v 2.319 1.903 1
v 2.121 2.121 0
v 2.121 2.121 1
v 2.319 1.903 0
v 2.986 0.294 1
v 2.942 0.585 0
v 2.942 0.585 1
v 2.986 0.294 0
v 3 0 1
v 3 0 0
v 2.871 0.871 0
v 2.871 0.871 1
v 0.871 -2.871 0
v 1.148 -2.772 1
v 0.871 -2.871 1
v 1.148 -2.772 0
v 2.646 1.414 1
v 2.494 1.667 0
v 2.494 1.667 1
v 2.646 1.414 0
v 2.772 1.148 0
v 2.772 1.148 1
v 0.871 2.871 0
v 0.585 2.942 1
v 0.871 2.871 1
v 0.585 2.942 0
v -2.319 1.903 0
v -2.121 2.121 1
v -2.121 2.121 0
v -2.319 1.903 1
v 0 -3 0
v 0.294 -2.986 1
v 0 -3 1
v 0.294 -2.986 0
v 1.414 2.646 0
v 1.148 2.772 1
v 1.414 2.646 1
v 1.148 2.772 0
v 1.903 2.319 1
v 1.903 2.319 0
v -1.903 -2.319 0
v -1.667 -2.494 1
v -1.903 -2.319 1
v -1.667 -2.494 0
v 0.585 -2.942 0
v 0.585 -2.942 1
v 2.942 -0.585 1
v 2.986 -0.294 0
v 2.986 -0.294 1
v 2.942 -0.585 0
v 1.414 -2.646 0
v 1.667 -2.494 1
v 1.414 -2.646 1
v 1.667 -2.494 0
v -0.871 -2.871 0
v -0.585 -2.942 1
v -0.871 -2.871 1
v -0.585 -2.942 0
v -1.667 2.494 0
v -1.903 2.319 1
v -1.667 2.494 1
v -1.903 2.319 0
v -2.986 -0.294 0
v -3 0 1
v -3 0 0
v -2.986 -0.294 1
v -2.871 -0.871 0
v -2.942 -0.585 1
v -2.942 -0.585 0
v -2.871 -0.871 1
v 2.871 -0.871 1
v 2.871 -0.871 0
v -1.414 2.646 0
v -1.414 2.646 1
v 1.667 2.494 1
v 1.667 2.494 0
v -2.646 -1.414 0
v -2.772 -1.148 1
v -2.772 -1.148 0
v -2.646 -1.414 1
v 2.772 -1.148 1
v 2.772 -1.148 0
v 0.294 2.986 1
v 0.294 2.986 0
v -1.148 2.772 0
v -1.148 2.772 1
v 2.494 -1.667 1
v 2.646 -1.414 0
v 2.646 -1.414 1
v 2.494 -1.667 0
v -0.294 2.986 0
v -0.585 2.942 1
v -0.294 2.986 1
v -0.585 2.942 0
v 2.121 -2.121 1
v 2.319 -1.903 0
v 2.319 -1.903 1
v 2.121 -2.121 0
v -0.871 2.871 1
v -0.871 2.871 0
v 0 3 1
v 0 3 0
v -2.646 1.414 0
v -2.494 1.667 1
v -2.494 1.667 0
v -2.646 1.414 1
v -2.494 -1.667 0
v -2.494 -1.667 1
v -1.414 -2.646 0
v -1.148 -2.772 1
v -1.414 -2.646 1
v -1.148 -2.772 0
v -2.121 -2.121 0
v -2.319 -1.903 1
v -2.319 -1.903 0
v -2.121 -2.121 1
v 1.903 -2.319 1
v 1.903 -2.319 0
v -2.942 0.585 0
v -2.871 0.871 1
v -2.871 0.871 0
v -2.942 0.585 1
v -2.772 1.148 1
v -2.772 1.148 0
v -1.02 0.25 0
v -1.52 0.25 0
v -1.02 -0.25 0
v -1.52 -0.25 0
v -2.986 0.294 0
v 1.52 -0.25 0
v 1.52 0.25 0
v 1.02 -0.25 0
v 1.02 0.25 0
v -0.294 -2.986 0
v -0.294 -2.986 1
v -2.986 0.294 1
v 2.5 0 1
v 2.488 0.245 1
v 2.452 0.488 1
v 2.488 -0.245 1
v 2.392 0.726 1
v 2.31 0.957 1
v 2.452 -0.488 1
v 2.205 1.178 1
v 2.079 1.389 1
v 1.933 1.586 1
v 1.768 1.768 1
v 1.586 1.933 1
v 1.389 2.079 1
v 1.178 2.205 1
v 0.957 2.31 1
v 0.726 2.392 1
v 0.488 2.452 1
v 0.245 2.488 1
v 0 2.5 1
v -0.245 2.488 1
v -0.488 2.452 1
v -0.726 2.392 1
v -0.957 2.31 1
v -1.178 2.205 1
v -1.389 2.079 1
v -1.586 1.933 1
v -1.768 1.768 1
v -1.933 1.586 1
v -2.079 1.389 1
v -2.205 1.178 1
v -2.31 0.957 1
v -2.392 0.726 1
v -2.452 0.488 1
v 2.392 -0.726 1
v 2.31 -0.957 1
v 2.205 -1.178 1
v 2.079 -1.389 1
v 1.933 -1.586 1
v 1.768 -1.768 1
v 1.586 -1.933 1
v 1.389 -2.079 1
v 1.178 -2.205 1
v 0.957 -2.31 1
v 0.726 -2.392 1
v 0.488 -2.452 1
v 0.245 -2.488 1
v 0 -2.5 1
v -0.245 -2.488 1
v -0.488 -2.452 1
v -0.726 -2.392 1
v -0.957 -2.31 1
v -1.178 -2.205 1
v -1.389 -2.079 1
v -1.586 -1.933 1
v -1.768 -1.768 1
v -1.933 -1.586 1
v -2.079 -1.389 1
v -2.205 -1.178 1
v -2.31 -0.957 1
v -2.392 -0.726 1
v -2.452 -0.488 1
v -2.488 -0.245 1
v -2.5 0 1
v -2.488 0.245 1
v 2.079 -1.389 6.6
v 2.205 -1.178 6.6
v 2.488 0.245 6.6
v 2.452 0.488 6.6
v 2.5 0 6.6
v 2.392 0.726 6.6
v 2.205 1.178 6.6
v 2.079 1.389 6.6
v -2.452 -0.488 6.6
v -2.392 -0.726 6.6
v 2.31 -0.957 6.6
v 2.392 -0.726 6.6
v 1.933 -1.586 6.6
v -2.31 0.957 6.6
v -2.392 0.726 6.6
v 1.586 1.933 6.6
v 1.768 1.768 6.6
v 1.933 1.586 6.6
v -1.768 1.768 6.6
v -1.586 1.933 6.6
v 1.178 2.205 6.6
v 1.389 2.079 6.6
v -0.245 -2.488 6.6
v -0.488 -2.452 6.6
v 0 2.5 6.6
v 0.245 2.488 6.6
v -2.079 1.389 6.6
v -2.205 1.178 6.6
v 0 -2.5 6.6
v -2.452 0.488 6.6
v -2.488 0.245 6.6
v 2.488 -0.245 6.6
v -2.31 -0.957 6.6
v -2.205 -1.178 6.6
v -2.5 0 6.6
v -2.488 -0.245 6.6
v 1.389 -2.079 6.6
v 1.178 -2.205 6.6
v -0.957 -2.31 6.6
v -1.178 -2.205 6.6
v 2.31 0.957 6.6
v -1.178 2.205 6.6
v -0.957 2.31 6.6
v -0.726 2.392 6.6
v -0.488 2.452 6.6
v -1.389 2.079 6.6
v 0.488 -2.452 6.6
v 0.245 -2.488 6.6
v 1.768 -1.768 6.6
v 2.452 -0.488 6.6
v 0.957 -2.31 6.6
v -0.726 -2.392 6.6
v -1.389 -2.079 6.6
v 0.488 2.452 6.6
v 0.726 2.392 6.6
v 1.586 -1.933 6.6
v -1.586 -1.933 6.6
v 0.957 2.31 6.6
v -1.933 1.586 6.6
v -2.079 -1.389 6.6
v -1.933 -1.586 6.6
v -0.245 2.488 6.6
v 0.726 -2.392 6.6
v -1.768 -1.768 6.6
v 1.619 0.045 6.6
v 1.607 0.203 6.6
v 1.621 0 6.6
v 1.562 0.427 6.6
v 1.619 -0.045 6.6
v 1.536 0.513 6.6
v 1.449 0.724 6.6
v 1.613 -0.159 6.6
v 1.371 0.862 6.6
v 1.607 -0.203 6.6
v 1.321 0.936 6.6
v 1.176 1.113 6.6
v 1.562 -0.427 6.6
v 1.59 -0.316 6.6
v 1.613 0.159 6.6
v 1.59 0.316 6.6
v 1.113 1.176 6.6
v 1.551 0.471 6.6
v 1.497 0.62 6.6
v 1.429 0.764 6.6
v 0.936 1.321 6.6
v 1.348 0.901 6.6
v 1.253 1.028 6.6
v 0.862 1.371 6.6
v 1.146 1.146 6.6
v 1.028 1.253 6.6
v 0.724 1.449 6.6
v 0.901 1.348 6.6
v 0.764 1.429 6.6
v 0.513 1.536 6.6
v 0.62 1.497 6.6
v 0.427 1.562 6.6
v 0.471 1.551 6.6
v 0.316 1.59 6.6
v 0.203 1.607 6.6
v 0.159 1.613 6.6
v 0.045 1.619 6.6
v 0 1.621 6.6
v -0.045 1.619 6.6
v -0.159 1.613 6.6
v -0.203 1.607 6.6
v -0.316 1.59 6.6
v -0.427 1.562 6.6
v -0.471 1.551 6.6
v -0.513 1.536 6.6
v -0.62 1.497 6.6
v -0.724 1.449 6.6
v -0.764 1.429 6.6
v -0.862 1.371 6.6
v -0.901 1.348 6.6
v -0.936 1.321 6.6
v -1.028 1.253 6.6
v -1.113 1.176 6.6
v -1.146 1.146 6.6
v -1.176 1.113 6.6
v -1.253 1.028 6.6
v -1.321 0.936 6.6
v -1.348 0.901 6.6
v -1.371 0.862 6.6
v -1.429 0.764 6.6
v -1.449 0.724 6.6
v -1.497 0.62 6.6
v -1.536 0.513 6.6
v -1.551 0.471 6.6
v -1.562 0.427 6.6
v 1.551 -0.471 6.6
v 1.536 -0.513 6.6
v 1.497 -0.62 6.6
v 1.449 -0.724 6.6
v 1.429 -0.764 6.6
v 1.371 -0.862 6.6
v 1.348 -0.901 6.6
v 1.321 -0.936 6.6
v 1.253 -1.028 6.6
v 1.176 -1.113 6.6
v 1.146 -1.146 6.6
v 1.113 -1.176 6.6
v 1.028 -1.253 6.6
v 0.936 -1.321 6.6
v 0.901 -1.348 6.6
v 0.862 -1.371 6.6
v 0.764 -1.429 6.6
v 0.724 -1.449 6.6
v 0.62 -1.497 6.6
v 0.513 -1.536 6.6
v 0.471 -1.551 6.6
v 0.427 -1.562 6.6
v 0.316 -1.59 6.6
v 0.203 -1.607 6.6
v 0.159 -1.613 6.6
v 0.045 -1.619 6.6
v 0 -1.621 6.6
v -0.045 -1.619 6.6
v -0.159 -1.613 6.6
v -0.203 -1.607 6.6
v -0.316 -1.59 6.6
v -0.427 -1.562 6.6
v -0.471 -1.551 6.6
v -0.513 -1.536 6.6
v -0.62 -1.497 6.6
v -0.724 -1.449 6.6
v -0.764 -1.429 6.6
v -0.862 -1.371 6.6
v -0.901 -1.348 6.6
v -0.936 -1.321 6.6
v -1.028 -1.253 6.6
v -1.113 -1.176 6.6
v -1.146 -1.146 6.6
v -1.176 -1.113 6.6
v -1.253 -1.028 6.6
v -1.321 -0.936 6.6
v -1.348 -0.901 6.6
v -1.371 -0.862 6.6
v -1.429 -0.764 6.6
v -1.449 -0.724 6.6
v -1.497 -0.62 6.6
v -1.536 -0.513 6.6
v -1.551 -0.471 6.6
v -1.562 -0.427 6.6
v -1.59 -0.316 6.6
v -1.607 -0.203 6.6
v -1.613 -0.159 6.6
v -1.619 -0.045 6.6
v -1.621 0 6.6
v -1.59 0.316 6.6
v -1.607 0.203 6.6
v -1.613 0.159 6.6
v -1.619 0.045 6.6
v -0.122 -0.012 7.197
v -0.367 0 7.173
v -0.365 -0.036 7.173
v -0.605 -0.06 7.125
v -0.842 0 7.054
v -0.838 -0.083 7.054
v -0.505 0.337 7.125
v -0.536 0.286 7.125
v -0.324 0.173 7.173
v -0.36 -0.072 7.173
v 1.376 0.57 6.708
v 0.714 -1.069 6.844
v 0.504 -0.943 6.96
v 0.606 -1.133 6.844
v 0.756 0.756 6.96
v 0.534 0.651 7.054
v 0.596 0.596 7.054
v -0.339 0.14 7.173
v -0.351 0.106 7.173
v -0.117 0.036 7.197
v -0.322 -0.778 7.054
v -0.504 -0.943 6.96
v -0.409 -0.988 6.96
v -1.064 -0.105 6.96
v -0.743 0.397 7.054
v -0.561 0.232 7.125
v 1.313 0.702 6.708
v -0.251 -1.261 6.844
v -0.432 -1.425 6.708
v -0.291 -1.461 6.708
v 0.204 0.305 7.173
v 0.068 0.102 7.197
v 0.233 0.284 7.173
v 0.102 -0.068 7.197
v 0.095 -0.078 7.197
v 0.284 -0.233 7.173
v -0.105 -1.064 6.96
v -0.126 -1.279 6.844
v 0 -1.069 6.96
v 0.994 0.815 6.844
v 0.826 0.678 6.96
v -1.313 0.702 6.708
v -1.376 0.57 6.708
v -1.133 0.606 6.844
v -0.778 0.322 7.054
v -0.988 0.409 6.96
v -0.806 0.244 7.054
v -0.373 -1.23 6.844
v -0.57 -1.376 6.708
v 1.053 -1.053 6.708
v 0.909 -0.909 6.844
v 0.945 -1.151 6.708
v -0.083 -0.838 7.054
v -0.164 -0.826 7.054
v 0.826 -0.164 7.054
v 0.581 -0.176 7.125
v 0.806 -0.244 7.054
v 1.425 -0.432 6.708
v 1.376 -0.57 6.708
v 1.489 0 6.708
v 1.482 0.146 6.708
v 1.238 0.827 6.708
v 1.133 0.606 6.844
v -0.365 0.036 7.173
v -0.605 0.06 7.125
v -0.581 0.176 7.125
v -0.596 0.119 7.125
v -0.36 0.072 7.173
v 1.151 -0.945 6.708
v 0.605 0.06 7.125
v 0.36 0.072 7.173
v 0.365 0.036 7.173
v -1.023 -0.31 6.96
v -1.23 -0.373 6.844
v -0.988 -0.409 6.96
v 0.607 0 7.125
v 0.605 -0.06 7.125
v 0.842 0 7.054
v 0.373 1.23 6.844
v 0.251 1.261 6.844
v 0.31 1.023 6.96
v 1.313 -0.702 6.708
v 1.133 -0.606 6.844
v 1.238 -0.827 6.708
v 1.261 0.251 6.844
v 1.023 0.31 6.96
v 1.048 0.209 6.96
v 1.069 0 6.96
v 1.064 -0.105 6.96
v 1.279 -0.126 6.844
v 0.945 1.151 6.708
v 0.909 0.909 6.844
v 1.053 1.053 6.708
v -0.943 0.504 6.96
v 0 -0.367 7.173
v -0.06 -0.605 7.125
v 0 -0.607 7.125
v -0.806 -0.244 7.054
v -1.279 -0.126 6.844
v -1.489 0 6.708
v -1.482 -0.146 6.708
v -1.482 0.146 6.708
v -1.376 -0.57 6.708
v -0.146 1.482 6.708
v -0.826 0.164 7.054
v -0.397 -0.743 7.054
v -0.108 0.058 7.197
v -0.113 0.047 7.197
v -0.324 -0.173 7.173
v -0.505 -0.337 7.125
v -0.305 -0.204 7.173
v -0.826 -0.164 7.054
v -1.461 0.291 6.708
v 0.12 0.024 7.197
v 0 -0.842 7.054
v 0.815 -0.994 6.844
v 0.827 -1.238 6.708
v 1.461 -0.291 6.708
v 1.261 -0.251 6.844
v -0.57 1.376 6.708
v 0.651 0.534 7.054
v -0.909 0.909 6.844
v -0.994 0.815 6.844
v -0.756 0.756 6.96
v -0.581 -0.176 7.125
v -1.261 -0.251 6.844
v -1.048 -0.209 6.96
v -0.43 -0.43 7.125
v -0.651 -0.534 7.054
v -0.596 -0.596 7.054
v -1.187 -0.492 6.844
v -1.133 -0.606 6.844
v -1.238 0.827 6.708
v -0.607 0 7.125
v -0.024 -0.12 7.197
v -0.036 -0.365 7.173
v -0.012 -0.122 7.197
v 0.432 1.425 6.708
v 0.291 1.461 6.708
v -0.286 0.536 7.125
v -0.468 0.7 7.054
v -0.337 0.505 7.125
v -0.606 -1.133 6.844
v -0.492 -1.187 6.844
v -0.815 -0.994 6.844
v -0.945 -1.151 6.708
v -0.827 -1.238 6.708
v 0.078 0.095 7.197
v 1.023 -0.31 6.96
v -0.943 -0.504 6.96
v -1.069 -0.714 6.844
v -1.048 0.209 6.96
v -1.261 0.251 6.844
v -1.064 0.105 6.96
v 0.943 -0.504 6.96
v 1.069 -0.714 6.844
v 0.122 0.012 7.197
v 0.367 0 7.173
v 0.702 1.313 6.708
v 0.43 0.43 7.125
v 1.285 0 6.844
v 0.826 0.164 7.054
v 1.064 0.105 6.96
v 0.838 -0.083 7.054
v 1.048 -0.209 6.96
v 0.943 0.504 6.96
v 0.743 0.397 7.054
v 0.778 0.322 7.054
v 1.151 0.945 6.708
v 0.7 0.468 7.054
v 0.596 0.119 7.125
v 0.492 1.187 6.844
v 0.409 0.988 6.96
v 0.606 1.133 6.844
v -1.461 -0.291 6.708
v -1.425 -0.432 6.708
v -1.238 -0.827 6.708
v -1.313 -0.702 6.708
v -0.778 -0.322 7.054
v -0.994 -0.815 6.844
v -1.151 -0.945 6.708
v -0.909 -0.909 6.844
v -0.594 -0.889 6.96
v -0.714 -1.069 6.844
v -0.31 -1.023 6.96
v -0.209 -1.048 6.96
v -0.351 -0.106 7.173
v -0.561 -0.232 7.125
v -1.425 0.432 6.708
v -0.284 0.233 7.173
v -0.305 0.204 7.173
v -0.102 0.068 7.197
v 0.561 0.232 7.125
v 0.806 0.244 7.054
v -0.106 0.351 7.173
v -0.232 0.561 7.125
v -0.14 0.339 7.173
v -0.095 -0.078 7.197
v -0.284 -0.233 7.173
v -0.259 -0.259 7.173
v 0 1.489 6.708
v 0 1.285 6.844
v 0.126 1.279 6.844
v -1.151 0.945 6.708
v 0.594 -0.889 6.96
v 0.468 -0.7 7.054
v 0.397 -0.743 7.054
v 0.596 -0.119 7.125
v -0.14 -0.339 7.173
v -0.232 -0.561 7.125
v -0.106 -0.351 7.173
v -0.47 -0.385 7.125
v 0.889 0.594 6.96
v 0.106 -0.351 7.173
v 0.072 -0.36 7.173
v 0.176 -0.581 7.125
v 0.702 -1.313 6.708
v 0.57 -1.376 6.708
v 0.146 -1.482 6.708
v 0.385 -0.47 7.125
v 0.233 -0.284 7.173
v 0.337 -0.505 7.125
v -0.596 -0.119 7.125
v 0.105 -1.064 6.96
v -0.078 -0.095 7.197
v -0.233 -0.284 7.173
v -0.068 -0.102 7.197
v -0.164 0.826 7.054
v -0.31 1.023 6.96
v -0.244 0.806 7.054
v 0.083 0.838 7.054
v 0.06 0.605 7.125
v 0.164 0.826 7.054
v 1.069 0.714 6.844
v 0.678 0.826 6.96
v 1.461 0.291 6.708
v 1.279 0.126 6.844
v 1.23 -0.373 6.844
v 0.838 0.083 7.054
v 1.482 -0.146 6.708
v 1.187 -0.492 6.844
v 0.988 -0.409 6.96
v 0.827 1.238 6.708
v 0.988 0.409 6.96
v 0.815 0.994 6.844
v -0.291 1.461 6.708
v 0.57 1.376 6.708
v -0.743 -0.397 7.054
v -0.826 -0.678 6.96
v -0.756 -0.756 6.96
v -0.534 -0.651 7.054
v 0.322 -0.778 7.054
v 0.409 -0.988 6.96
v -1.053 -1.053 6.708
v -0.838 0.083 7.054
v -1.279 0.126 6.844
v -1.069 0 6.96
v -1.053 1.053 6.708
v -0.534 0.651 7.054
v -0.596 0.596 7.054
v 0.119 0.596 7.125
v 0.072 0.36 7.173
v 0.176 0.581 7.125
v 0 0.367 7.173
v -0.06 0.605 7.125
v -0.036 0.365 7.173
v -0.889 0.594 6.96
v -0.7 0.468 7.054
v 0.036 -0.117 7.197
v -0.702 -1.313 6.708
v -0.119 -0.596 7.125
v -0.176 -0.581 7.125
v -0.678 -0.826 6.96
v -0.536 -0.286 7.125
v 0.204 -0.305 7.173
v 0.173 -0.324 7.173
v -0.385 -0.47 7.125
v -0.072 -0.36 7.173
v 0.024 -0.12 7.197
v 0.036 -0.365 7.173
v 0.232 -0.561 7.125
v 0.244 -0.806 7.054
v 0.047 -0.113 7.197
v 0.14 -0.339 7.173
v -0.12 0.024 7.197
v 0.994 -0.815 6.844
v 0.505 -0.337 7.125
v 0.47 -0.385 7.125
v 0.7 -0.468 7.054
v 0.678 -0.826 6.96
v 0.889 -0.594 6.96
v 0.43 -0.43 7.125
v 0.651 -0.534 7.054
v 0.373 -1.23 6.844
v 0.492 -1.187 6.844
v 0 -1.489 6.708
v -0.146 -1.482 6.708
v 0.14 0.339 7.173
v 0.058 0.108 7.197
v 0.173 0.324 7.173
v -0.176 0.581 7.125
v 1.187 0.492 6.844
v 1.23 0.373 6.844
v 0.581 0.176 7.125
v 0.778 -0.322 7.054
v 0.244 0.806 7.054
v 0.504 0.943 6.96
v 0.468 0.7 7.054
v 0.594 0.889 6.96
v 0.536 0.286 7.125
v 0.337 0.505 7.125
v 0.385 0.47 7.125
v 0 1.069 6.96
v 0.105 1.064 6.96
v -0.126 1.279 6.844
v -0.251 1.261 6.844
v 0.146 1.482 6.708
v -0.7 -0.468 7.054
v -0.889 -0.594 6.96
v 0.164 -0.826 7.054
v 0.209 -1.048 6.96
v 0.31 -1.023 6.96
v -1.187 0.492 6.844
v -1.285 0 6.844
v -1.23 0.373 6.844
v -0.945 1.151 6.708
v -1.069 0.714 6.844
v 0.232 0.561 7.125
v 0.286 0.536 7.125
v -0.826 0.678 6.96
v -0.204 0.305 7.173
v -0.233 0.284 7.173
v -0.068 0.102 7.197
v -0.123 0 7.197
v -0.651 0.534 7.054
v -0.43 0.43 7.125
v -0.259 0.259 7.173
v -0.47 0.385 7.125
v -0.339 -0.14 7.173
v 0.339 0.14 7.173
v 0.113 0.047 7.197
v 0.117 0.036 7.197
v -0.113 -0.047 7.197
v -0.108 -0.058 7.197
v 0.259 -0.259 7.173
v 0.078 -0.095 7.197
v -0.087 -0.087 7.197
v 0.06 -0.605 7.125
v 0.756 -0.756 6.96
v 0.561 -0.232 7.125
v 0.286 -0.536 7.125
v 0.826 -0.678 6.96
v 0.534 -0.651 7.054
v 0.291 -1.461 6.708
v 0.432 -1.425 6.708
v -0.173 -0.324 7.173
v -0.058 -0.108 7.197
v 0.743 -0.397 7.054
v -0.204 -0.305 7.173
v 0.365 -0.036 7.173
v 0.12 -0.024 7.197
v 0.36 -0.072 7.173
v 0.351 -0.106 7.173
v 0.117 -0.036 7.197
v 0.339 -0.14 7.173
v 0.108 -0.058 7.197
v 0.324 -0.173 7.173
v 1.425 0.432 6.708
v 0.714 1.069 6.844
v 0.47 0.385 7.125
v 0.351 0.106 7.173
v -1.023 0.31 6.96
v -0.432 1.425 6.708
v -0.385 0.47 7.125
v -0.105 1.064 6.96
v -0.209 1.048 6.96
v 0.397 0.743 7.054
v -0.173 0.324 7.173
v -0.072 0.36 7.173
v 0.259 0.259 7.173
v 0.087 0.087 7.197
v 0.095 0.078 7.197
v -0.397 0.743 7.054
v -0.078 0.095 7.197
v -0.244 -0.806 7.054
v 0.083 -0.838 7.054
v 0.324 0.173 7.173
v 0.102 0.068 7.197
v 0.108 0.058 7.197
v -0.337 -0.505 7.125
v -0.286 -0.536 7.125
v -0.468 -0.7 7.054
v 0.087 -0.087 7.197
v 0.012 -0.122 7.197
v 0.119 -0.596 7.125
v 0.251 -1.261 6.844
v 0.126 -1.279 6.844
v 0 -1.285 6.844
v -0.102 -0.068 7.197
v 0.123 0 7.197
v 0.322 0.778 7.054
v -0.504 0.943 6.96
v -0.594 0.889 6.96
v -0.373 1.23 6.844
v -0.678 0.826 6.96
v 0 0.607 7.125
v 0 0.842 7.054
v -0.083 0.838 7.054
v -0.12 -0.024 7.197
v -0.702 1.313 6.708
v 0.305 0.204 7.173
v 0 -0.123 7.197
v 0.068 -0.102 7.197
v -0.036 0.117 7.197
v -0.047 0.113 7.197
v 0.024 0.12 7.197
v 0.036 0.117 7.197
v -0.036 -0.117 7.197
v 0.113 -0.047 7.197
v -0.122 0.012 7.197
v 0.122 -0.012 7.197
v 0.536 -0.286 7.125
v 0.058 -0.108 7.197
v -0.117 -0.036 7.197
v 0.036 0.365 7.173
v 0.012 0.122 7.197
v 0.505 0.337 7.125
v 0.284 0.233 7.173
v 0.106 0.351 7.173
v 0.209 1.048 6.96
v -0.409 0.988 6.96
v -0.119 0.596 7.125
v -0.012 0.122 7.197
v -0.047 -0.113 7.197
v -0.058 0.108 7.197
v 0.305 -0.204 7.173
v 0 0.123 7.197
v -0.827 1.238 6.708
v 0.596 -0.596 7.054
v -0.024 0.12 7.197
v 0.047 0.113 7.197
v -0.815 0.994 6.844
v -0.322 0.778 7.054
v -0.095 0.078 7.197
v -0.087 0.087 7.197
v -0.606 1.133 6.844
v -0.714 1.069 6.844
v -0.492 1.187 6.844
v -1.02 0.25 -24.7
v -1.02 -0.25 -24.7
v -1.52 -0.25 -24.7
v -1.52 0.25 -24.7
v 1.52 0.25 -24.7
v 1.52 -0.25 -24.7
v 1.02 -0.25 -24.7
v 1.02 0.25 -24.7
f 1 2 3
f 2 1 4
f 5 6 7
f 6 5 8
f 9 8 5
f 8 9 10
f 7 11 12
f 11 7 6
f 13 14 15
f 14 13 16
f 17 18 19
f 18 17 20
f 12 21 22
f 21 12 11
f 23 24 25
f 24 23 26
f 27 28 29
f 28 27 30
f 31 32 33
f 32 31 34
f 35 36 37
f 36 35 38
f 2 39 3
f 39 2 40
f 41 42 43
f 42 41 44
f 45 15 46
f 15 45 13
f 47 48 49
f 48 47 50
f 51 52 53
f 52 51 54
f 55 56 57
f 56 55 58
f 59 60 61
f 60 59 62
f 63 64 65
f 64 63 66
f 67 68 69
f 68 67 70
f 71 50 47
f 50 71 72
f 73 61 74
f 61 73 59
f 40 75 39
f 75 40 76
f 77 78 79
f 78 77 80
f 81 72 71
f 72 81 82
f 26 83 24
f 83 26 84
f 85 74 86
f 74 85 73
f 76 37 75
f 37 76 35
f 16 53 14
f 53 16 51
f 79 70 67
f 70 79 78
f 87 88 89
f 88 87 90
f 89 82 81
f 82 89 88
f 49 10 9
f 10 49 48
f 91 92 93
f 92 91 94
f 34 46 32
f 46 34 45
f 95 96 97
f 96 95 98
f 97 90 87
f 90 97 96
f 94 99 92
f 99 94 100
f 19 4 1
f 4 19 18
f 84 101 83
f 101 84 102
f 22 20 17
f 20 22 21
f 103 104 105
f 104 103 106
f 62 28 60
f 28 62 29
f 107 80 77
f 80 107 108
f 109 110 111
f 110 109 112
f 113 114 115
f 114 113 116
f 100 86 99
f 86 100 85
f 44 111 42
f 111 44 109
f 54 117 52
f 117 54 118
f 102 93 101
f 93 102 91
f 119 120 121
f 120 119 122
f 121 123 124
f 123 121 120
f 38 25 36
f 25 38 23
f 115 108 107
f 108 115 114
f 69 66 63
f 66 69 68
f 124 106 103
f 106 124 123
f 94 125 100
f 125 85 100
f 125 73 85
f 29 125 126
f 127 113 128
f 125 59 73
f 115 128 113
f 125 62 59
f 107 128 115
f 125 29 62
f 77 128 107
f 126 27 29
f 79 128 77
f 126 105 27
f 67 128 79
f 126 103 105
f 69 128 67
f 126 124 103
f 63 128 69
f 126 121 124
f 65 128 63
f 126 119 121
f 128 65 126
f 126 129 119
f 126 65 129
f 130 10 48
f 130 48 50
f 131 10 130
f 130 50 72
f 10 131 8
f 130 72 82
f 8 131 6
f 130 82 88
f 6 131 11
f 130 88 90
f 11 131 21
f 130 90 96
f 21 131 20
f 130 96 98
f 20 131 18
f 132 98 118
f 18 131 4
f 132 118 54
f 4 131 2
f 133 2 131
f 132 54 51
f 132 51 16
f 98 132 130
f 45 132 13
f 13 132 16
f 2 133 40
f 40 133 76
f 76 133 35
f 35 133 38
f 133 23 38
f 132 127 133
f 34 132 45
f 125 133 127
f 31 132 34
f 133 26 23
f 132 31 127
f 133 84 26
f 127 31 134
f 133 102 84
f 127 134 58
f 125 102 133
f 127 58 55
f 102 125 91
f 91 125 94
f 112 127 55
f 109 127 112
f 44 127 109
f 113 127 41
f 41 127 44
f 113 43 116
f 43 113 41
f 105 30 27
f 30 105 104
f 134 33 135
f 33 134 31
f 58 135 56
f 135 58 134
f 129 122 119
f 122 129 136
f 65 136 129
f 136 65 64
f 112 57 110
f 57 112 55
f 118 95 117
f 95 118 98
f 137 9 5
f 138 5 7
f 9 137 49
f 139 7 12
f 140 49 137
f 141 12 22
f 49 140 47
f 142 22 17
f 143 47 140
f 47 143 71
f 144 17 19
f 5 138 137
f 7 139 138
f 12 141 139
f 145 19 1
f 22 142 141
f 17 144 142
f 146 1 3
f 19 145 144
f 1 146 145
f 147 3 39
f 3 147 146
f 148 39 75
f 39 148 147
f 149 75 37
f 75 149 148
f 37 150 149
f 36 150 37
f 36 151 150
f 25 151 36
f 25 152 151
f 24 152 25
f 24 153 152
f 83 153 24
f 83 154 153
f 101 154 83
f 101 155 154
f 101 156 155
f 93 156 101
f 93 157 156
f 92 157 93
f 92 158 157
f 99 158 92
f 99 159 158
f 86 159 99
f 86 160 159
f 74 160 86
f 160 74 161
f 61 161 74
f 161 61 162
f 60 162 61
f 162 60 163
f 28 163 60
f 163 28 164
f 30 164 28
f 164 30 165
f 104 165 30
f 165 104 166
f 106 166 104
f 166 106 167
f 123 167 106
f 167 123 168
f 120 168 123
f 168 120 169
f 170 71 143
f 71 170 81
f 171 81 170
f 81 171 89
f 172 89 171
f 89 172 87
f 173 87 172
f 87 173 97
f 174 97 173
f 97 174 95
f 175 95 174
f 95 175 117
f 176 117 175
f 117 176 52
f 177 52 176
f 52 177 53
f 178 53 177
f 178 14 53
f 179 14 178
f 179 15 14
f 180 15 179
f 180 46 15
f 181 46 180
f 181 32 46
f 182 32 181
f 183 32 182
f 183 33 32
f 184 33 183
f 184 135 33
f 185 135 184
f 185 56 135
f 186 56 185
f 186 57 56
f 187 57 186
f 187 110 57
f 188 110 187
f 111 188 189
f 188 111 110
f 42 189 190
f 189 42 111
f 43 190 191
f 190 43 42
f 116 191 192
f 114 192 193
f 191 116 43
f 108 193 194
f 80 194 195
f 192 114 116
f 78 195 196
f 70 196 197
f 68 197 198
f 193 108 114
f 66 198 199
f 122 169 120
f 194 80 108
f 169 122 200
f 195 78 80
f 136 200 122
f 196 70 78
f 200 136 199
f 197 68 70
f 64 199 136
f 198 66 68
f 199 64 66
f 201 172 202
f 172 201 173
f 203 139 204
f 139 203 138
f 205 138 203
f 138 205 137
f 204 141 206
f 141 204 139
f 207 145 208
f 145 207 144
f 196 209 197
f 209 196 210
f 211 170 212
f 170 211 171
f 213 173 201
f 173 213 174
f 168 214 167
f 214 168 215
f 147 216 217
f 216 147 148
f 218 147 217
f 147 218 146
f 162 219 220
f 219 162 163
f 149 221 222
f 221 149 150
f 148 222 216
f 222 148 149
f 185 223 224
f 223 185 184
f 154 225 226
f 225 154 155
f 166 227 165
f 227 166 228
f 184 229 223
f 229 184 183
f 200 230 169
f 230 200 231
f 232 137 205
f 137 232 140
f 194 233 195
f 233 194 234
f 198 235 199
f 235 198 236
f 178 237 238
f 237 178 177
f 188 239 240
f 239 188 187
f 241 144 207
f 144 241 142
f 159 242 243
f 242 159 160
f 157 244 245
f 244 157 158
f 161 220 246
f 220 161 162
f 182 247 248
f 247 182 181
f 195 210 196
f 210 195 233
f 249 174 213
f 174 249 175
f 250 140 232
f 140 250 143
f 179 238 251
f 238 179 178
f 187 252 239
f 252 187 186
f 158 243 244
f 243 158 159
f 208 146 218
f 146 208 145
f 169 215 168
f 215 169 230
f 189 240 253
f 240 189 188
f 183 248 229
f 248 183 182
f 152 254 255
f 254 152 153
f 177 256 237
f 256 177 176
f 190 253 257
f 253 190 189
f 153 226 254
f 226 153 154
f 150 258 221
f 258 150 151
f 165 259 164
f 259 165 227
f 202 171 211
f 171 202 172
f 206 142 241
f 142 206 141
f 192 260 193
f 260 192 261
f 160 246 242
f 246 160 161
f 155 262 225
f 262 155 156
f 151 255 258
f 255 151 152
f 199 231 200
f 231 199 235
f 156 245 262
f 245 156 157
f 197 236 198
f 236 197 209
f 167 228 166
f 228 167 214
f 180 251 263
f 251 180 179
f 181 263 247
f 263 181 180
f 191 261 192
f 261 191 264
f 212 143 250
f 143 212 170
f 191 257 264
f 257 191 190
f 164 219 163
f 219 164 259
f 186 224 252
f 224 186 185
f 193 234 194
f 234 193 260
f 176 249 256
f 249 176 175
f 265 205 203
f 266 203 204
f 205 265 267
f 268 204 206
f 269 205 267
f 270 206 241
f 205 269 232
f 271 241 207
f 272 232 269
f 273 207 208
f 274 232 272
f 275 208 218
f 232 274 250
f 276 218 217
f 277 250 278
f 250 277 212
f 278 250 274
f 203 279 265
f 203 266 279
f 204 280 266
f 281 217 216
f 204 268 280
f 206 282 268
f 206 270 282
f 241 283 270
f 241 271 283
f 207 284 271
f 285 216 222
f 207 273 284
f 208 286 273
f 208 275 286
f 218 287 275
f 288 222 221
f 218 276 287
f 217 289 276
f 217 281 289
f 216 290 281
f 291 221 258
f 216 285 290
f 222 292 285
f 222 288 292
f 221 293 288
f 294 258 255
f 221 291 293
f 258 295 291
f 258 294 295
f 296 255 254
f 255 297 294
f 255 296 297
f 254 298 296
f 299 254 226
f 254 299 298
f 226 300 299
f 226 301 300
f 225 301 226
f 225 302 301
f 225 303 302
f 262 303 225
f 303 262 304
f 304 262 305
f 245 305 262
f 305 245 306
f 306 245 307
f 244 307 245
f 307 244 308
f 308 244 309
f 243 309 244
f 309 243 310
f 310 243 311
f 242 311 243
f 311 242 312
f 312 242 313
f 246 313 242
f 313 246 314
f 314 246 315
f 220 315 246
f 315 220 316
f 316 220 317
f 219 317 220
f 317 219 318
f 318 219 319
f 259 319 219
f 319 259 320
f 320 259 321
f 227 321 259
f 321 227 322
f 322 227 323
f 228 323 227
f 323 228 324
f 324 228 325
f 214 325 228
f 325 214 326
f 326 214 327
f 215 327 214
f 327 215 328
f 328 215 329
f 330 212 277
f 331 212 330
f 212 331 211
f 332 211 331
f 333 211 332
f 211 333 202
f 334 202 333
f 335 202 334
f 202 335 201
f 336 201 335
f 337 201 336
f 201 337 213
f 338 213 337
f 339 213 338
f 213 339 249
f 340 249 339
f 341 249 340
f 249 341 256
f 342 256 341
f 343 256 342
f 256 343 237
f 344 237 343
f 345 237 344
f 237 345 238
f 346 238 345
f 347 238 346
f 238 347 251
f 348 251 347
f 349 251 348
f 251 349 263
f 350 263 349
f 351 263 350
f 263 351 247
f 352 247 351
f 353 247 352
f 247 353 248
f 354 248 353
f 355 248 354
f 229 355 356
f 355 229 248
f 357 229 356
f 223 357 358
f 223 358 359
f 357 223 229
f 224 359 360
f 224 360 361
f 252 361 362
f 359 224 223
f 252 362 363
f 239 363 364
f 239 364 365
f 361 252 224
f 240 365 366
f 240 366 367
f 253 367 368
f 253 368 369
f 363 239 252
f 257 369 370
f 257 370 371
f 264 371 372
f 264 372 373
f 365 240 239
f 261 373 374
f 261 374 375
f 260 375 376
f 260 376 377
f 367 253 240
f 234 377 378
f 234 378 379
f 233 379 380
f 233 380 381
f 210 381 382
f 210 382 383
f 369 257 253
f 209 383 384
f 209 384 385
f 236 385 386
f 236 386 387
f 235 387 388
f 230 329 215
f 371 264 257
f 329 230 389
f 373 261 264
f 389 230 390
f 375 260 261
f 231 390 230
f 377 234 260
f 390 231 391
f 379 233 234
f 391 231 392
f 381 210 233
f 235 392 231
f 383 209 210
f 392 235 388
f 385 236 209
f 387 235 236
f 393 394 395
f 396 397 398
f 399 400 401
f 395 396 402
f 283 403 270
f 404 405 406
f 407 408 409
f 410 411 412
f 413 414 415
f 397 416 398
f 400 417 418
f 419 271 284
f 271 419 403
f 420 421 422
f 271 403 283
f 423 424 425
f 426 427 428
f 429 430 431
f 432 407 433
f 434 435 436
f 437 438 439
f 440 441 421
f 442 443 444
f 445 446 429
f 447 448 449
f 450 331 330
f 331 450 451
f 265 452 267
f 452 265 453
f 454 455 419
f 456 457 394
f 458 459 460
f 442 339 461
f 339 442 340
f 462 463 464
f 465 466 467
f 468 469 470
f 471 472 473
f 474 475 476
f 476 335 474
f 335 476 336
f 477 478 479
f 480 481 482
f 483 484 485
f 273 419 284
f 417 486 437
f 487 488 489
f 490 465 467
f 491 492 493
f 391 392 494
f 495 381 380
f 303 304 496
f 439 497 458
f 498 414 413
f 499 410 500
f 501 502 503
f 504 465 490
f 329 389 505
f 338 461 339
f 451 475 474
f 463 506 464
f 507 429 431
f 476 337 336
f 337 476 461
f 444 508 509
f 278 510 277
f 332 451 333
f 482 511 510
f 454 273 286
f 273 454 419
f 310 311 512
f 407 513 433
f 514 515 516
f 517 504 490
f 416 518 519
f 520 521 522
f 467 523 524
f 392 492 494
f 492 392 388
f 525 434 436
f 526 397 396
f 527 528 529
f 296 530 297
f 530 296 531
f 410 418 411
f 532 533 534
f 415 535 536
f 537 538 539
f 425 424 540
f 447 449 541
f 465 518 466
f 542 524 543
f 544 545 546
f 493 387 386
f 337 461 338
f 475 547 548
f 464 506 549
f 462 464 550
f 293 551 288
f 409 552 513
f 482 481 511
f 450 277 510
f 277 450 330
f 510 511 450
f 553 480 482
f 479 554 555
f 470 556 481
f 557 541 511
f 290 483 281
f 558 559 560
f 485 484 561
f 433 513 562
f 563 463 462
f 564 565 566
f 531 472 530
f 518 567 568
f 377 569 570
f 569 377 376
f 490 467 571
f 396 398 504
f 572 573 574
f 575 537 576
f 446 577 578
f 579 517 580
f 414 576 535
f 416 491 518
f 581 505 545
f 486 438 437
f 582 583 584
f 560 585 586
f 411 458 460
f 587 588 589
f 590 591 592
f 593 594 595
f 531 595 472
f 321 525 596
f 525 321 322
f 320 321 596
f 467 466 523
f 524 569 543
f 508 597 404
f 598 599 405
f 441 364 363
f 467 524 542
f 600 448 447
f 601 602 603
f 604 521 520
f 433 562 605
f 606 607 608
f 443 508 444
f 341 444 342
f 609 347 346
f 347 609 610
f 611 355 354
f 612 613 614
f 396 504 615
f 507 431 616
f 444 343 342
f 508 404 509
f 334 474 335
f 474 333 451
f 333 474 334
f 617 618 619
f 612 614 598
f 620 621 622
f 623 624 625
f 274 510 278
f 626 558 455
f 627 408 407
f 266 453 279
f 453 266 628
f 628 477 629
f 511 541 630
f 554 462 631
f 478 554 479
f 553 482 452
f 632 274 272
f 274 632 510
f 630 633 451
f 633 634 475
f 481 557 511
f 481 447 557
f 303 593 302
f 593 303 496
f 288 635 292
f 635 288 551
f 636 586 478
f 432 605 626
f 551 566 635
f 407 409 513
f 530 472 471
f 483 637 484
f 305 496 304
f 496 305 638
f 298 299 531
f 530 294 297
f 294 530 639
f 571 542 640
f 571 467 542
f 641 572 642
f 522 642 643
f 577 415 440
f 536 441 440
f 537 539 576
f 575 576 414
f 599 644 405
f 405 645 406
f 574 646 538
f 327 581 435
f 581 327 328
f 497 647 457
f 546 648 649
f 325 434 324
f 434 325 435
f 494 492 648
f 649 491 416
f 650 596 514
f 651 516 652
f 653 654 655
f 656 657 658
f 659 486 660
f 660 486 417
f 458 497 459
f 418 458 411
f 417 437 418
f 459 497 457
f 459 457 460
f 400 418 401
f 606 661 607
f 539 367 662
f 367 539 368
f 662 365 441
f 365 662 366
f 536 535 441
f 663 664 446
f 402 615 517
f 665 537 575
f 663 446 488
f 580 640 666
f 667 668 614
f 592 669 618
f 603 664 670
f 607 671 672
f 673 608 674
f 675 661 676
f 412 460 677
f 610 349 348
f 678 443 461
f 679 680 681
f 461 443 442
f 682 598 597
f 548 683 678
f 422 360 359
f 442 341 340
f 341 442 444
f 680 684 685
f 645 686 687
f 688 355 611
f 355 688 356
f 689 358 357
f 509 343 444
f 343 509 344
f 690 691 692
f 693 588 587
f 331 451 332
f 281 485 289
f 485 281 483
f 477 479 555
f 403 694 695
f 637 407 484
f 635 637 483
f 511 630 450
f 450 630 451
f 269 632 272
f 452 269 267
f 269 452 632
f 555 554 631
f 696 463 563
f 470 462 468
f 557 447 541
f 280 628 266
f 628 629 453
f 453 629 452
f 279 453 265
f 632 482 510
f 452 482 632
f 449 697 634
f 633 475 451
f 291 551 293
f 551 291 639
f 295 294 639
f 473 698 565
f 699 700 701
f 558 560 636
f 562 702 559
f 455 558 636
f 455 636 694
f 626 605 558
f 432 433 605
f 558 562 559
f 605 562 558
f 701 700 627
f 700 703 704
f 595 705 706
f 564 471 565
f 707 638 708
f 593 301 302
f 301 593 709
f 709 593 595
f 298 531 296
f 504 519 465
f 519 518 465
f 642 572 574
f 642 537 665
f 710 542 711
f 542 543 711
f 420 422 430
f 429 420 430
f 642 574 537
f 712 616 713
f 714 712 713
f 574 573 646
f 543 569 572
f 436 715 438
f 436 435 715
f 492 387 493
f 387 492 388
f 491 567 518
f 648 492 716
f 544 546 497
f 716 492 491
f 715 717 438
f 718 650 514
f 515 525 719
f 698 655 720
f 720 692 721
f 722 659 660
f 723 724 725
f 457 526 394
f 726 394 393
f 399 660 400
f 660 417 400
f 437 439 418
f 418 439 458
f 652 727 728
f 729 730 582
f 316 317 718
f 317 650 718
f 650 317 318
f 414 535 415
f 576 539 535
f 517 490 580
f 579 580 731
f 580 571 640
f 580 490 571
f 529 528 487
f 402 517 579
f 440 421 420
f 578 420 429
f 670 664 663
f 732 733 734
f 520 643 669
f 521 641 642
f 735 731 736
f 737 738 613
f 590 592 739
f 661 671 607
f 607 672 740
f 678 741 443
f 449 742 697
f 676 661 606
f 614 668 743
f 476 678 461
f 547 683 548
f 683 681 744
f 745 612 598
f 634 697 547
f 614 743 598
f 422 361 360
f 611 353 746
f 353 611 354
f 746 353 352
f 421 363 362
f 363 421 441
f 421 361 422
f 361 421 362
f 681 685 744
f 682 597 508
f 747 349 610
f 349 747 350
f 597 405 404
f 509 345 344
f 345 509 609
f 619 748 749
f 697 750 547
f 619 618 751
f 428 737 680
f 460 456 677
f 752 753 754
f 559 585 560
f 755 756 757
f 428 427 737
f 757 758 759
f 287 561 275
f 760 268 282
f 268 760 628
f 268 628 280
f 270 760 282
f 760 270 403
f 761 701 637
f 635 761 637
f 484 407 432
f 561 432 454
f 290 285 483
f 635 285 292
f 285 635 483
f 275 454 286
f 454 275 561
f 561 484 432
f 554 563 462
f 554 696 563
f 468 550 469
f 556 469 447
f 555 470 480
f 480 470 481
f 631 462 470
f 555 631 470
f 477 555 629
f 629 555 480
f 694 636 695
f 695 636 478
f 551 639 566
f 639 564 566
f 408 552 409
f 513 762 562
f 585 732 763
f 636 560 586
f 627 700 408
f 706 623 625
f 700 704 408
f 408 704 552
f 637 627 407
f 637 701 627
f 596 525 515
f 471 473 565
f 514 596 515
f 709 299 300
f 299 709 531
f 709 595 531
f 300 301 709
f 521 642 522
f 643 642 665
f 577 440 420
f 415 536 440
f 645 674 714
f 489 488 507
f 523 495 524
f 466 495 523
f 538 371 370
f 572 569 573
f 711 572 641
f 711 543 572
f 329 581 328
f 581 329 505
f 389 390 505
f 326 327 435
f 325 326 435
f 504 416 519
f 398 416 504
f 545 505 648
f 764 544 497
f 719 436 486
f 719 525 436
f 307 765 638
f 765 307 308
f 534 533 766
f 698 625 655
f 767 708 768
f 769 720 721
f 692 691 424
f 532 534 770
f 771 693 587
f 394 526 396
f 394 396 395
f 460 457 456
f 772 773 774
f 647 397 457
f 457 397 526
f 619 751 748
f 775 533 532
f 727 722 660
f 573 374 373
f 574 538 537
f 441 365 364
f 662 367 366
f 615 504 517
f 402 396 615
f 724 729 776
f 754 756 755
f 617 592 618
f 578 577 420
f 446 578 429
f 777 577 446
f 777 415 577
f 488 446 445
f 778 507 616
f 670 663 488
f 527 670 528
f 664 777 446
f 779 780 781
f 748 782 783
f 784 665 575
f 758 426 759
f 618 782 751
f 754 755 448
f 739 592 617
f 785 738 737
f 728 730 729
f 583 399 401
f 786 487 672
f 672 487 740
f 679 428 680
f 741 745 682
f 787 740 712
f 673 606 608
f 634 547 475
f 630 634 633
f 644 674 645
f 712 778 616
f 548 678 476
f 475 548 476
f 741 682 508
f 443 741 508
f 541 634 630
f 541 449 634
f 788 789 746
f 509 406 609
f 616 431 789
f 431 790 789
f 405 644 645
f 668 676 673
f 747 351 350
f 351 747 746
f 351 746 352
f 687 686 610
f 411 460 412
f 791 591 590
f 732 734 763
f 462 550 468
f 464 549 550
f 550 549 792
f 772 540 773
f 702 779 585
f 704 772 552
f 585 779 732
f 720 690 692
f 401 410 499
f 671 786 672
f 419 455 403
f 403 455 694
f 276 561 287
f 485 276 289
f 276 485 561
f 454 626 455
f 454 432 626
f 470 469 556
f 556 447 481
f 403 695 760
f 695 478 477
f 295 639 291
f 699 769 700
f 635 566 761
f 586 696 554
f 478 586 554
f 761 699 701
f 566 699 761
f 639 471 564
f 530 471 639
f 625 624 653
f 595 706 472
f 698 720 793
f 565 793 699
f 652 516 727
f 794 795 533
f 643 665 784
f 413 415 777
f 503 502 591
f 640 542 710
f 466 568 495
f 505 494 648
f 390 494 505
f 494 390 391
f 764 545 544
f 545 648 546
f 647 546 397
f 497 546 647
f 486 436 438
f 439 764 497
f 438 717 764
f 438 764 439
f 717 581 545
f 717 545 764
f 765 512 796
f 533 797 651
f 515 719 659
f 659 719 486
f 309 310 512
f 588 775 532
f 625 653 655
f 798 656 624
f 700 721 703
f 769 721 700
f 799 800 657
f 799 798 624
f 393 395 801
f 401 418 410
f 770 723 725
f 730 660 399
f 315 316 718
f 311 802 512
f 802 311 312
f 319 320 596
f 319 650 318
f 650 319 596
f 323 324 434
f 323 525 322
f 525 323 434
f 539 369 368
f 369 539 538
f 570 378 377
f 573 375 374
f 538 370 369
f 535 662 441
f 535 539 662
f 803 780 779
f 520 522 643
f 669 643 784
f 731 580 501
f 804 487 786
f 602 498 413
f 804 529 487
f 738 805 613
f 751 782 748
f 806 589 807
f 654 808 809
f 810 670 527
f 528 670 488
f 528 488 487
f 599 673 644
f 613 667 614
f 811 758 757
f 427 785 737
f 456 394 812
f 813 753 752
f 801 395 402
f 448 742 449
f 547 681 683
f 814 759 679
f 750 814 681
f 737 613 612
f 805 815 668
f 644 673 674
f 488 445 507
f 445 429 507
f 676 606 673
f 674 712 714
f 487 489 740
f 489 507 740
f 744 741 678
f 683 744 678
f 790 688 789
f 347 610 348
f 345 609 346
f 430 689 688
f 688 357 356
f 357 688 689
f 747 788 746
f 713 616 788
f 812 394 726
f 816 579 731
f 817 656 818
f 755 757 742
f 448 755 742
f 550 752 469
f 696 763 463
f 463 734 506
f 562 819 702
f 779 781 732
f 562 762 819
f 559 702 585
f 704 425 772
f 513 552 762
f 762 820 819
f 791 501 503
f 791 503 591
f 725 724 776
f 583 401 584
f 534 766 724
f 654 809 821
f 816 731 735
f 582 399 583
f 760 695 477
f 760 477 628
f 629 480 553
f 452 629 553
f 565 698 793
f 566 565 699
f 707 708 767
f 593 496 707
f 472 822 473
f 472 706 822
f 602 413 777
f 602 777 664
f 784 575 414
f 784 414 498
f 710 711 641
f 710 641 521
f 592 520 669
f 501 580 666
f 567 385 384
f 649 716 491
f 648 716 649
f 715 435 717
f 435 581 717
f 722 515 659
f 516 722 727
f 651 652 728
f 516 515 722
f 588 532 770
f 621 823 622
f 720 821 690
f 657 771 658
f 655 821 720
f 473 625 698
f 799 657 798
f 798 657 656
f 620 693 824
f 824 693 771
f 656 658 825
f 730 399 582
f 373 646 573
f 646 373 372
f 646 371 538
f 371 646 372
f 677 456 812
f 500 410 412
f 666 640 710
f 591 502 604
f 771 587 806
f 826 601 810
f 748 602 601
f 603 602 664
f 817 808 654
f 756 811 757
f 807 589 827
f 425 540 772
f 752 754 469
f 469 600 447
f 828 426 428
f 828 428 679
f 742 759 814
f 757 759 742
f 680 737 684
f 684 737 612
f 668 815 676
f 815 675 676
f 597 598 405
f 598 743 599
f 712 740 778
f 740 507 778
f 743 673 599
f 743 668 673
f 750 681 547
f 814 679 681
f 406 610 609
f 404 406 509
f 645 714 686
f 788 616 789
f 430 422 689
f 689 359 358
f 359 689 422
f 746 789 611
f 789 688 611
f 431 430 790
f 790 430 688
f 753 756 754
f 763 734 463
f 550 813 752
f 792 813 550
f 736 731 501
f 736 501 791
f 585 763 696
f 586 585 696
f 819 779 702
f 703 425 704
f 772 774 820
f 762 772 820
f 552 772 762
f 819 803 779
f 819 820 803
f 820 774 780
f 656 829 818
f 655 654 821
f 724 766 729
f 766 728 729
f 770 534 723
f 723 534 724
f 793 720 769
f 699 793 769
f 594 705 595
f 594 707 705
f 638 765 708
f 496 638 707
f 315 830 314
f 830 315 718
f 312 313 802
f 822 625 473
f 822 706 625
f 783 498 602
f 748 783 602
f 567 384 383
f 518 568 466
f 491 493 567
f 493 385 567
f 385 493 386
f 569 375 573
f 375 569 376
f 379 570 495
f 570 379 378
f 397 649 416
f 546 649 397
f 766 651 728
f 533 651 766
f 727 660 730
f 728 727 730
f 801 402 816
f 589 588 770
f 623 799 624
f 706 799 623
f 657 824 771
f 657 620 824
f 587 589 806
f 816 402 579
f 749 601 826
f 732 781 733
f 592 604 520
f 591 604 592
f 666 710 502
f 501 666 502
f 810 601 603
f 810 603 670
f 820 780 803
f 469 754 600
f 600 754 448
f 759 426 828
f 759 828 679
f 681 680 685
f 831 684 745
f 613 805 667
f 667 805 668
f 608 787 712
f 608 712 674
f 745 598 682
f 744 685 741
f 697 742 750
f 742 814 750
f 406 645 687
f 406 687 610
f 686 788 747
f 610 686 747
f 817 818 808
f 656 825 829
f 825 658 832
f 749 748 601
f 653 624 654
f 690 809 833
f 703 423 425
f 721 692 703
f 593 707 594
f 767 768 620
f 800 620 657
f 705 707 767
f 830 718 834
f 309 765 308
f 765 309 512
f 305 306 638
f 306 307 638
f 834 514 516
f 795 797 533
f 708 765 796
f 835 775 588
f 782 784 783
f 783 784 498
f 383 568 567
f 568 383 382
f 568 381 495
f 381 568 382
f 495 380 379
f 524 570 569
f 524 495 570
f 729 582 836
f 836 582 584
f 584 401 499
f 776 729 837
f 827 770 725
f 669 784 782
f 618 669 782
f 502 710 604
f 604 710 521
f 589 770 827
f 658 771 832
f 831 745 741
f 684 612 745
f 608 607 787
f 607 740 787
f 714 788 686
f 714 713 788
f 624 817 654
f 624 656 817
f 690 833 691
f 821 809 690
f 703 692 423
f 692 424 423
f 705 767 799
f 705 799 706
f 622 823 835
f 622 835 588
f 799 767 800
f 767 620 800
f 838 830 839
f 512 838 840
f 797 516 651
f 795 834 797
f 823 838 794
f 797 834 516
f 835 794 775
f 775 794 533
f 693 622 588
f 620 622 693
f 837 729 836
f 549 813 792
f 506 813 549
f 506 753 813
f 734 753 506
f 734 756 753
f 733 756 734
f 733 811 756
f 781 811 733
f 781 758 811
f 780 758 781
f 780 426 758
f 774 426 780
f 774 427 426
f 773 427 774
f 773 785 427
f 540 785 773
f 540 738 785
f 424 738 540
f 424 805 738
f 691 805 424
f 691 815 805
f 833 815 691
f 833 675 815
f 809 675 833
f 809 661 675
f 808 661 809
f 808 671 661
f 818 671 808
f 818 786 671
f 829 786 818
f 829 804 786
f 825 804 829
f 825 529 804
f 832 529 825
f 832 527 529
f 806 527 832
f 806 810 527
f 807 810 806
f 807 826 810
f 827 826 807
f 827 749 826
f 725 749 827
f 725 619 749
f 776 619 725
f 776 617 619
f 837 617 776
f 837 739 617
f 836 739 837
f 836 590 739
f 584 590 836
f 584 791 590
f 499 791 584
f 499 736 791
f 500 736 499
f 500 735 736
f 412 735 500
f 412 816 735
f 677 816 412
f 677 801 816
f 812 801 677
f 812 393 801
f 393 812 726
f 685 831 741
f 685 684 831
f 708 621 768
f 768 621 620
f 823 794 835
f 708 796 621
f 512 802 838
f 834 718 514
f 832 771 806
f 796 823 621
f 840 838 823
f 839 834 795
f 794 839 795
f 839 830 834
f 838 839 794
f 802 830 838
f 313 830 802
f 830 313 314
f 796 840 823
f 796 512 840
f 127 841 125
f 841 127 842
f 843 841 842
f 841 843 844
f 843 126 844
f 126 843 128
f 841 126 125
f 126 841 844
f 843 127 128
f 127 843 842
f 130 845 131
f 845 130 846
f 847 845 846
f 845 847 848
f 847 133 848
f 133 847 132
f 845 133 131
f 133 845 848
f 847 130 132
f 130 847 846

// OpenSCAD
// Standalone 5.0mm through-hole LED (5.9mm body height) - ONE connected solid

// Parameters
led_diameter_mm = 5;            //[2.5:10:0.1]
body_height_mm = 5.9;           //[3:12:0.1]
lead_count = 2;                 //[2:2:1]
lead_pitch_mm = 2.54;           //[1.5:5:0.01]
lead_length_mm = 25;            //[10:50:1]
lead_thickness_mm = 0.5;        //[0.3:1:0.05]
rim_thickness_mm = 1;           //[0.5:2:0.1]
rim_diameter_mm = 6;            //[5.2:12:0.1]
overlap_mm = 0.6;               //[0.2:2:0.1]
lens_round_radius_mm = 2.5;     //[1.25:5:0.1]

// Quality
$fn = 64;

// LED5mm - complete geometry (single connected solid)
module LED5mm() {

  // Z reference: bottom of rim flange at z=0
  rim_zc  = rim_thickness_mm/2;
  body_zc = rim_thickness_mm + body_height_mm/2 - overlap_mm/2;

  // Place dome so it overlaps into the cylinder (connected)
  dome_zc = (rim_thickness_mm + body_height_mm) - lens_round_radius_mm + overlap_mm/2;

  // Leads: start slightly inside rim to guarantee connection
  lead_zc = -(lead_length_mm/2) + overlap_mm/2;

  union() {
    // Rim flange
    translate([0, 0, rim_zc])
      cylinder(r=rim_diameter_mm/2, h=rim_thickness_mm, center=true);

    // LED body (cylindrical)
    translate([0, 0, body_zc])
      cylinder(r=led_diameter_mm/2, h=body_height_mm, center=true);

    // Rounded lens top
    translate([0, 0, dome_zc])
      sphere(r=lens_round_radius_mm);

    // Leads (two rectangular pins)
    translate([-lead_pitch_mm/2, 0, lead_zc])
      cube([lead_thickness_mm, lead_thickness_mm, lead_length_mm], center=true);

    translate([ lead_pitch_mm/2, 0, lead_zc])
      cube([lead_thickness_mm, lead_thickness_mm, lead_length_mm], center=true);
  }
}

LED5mm();
